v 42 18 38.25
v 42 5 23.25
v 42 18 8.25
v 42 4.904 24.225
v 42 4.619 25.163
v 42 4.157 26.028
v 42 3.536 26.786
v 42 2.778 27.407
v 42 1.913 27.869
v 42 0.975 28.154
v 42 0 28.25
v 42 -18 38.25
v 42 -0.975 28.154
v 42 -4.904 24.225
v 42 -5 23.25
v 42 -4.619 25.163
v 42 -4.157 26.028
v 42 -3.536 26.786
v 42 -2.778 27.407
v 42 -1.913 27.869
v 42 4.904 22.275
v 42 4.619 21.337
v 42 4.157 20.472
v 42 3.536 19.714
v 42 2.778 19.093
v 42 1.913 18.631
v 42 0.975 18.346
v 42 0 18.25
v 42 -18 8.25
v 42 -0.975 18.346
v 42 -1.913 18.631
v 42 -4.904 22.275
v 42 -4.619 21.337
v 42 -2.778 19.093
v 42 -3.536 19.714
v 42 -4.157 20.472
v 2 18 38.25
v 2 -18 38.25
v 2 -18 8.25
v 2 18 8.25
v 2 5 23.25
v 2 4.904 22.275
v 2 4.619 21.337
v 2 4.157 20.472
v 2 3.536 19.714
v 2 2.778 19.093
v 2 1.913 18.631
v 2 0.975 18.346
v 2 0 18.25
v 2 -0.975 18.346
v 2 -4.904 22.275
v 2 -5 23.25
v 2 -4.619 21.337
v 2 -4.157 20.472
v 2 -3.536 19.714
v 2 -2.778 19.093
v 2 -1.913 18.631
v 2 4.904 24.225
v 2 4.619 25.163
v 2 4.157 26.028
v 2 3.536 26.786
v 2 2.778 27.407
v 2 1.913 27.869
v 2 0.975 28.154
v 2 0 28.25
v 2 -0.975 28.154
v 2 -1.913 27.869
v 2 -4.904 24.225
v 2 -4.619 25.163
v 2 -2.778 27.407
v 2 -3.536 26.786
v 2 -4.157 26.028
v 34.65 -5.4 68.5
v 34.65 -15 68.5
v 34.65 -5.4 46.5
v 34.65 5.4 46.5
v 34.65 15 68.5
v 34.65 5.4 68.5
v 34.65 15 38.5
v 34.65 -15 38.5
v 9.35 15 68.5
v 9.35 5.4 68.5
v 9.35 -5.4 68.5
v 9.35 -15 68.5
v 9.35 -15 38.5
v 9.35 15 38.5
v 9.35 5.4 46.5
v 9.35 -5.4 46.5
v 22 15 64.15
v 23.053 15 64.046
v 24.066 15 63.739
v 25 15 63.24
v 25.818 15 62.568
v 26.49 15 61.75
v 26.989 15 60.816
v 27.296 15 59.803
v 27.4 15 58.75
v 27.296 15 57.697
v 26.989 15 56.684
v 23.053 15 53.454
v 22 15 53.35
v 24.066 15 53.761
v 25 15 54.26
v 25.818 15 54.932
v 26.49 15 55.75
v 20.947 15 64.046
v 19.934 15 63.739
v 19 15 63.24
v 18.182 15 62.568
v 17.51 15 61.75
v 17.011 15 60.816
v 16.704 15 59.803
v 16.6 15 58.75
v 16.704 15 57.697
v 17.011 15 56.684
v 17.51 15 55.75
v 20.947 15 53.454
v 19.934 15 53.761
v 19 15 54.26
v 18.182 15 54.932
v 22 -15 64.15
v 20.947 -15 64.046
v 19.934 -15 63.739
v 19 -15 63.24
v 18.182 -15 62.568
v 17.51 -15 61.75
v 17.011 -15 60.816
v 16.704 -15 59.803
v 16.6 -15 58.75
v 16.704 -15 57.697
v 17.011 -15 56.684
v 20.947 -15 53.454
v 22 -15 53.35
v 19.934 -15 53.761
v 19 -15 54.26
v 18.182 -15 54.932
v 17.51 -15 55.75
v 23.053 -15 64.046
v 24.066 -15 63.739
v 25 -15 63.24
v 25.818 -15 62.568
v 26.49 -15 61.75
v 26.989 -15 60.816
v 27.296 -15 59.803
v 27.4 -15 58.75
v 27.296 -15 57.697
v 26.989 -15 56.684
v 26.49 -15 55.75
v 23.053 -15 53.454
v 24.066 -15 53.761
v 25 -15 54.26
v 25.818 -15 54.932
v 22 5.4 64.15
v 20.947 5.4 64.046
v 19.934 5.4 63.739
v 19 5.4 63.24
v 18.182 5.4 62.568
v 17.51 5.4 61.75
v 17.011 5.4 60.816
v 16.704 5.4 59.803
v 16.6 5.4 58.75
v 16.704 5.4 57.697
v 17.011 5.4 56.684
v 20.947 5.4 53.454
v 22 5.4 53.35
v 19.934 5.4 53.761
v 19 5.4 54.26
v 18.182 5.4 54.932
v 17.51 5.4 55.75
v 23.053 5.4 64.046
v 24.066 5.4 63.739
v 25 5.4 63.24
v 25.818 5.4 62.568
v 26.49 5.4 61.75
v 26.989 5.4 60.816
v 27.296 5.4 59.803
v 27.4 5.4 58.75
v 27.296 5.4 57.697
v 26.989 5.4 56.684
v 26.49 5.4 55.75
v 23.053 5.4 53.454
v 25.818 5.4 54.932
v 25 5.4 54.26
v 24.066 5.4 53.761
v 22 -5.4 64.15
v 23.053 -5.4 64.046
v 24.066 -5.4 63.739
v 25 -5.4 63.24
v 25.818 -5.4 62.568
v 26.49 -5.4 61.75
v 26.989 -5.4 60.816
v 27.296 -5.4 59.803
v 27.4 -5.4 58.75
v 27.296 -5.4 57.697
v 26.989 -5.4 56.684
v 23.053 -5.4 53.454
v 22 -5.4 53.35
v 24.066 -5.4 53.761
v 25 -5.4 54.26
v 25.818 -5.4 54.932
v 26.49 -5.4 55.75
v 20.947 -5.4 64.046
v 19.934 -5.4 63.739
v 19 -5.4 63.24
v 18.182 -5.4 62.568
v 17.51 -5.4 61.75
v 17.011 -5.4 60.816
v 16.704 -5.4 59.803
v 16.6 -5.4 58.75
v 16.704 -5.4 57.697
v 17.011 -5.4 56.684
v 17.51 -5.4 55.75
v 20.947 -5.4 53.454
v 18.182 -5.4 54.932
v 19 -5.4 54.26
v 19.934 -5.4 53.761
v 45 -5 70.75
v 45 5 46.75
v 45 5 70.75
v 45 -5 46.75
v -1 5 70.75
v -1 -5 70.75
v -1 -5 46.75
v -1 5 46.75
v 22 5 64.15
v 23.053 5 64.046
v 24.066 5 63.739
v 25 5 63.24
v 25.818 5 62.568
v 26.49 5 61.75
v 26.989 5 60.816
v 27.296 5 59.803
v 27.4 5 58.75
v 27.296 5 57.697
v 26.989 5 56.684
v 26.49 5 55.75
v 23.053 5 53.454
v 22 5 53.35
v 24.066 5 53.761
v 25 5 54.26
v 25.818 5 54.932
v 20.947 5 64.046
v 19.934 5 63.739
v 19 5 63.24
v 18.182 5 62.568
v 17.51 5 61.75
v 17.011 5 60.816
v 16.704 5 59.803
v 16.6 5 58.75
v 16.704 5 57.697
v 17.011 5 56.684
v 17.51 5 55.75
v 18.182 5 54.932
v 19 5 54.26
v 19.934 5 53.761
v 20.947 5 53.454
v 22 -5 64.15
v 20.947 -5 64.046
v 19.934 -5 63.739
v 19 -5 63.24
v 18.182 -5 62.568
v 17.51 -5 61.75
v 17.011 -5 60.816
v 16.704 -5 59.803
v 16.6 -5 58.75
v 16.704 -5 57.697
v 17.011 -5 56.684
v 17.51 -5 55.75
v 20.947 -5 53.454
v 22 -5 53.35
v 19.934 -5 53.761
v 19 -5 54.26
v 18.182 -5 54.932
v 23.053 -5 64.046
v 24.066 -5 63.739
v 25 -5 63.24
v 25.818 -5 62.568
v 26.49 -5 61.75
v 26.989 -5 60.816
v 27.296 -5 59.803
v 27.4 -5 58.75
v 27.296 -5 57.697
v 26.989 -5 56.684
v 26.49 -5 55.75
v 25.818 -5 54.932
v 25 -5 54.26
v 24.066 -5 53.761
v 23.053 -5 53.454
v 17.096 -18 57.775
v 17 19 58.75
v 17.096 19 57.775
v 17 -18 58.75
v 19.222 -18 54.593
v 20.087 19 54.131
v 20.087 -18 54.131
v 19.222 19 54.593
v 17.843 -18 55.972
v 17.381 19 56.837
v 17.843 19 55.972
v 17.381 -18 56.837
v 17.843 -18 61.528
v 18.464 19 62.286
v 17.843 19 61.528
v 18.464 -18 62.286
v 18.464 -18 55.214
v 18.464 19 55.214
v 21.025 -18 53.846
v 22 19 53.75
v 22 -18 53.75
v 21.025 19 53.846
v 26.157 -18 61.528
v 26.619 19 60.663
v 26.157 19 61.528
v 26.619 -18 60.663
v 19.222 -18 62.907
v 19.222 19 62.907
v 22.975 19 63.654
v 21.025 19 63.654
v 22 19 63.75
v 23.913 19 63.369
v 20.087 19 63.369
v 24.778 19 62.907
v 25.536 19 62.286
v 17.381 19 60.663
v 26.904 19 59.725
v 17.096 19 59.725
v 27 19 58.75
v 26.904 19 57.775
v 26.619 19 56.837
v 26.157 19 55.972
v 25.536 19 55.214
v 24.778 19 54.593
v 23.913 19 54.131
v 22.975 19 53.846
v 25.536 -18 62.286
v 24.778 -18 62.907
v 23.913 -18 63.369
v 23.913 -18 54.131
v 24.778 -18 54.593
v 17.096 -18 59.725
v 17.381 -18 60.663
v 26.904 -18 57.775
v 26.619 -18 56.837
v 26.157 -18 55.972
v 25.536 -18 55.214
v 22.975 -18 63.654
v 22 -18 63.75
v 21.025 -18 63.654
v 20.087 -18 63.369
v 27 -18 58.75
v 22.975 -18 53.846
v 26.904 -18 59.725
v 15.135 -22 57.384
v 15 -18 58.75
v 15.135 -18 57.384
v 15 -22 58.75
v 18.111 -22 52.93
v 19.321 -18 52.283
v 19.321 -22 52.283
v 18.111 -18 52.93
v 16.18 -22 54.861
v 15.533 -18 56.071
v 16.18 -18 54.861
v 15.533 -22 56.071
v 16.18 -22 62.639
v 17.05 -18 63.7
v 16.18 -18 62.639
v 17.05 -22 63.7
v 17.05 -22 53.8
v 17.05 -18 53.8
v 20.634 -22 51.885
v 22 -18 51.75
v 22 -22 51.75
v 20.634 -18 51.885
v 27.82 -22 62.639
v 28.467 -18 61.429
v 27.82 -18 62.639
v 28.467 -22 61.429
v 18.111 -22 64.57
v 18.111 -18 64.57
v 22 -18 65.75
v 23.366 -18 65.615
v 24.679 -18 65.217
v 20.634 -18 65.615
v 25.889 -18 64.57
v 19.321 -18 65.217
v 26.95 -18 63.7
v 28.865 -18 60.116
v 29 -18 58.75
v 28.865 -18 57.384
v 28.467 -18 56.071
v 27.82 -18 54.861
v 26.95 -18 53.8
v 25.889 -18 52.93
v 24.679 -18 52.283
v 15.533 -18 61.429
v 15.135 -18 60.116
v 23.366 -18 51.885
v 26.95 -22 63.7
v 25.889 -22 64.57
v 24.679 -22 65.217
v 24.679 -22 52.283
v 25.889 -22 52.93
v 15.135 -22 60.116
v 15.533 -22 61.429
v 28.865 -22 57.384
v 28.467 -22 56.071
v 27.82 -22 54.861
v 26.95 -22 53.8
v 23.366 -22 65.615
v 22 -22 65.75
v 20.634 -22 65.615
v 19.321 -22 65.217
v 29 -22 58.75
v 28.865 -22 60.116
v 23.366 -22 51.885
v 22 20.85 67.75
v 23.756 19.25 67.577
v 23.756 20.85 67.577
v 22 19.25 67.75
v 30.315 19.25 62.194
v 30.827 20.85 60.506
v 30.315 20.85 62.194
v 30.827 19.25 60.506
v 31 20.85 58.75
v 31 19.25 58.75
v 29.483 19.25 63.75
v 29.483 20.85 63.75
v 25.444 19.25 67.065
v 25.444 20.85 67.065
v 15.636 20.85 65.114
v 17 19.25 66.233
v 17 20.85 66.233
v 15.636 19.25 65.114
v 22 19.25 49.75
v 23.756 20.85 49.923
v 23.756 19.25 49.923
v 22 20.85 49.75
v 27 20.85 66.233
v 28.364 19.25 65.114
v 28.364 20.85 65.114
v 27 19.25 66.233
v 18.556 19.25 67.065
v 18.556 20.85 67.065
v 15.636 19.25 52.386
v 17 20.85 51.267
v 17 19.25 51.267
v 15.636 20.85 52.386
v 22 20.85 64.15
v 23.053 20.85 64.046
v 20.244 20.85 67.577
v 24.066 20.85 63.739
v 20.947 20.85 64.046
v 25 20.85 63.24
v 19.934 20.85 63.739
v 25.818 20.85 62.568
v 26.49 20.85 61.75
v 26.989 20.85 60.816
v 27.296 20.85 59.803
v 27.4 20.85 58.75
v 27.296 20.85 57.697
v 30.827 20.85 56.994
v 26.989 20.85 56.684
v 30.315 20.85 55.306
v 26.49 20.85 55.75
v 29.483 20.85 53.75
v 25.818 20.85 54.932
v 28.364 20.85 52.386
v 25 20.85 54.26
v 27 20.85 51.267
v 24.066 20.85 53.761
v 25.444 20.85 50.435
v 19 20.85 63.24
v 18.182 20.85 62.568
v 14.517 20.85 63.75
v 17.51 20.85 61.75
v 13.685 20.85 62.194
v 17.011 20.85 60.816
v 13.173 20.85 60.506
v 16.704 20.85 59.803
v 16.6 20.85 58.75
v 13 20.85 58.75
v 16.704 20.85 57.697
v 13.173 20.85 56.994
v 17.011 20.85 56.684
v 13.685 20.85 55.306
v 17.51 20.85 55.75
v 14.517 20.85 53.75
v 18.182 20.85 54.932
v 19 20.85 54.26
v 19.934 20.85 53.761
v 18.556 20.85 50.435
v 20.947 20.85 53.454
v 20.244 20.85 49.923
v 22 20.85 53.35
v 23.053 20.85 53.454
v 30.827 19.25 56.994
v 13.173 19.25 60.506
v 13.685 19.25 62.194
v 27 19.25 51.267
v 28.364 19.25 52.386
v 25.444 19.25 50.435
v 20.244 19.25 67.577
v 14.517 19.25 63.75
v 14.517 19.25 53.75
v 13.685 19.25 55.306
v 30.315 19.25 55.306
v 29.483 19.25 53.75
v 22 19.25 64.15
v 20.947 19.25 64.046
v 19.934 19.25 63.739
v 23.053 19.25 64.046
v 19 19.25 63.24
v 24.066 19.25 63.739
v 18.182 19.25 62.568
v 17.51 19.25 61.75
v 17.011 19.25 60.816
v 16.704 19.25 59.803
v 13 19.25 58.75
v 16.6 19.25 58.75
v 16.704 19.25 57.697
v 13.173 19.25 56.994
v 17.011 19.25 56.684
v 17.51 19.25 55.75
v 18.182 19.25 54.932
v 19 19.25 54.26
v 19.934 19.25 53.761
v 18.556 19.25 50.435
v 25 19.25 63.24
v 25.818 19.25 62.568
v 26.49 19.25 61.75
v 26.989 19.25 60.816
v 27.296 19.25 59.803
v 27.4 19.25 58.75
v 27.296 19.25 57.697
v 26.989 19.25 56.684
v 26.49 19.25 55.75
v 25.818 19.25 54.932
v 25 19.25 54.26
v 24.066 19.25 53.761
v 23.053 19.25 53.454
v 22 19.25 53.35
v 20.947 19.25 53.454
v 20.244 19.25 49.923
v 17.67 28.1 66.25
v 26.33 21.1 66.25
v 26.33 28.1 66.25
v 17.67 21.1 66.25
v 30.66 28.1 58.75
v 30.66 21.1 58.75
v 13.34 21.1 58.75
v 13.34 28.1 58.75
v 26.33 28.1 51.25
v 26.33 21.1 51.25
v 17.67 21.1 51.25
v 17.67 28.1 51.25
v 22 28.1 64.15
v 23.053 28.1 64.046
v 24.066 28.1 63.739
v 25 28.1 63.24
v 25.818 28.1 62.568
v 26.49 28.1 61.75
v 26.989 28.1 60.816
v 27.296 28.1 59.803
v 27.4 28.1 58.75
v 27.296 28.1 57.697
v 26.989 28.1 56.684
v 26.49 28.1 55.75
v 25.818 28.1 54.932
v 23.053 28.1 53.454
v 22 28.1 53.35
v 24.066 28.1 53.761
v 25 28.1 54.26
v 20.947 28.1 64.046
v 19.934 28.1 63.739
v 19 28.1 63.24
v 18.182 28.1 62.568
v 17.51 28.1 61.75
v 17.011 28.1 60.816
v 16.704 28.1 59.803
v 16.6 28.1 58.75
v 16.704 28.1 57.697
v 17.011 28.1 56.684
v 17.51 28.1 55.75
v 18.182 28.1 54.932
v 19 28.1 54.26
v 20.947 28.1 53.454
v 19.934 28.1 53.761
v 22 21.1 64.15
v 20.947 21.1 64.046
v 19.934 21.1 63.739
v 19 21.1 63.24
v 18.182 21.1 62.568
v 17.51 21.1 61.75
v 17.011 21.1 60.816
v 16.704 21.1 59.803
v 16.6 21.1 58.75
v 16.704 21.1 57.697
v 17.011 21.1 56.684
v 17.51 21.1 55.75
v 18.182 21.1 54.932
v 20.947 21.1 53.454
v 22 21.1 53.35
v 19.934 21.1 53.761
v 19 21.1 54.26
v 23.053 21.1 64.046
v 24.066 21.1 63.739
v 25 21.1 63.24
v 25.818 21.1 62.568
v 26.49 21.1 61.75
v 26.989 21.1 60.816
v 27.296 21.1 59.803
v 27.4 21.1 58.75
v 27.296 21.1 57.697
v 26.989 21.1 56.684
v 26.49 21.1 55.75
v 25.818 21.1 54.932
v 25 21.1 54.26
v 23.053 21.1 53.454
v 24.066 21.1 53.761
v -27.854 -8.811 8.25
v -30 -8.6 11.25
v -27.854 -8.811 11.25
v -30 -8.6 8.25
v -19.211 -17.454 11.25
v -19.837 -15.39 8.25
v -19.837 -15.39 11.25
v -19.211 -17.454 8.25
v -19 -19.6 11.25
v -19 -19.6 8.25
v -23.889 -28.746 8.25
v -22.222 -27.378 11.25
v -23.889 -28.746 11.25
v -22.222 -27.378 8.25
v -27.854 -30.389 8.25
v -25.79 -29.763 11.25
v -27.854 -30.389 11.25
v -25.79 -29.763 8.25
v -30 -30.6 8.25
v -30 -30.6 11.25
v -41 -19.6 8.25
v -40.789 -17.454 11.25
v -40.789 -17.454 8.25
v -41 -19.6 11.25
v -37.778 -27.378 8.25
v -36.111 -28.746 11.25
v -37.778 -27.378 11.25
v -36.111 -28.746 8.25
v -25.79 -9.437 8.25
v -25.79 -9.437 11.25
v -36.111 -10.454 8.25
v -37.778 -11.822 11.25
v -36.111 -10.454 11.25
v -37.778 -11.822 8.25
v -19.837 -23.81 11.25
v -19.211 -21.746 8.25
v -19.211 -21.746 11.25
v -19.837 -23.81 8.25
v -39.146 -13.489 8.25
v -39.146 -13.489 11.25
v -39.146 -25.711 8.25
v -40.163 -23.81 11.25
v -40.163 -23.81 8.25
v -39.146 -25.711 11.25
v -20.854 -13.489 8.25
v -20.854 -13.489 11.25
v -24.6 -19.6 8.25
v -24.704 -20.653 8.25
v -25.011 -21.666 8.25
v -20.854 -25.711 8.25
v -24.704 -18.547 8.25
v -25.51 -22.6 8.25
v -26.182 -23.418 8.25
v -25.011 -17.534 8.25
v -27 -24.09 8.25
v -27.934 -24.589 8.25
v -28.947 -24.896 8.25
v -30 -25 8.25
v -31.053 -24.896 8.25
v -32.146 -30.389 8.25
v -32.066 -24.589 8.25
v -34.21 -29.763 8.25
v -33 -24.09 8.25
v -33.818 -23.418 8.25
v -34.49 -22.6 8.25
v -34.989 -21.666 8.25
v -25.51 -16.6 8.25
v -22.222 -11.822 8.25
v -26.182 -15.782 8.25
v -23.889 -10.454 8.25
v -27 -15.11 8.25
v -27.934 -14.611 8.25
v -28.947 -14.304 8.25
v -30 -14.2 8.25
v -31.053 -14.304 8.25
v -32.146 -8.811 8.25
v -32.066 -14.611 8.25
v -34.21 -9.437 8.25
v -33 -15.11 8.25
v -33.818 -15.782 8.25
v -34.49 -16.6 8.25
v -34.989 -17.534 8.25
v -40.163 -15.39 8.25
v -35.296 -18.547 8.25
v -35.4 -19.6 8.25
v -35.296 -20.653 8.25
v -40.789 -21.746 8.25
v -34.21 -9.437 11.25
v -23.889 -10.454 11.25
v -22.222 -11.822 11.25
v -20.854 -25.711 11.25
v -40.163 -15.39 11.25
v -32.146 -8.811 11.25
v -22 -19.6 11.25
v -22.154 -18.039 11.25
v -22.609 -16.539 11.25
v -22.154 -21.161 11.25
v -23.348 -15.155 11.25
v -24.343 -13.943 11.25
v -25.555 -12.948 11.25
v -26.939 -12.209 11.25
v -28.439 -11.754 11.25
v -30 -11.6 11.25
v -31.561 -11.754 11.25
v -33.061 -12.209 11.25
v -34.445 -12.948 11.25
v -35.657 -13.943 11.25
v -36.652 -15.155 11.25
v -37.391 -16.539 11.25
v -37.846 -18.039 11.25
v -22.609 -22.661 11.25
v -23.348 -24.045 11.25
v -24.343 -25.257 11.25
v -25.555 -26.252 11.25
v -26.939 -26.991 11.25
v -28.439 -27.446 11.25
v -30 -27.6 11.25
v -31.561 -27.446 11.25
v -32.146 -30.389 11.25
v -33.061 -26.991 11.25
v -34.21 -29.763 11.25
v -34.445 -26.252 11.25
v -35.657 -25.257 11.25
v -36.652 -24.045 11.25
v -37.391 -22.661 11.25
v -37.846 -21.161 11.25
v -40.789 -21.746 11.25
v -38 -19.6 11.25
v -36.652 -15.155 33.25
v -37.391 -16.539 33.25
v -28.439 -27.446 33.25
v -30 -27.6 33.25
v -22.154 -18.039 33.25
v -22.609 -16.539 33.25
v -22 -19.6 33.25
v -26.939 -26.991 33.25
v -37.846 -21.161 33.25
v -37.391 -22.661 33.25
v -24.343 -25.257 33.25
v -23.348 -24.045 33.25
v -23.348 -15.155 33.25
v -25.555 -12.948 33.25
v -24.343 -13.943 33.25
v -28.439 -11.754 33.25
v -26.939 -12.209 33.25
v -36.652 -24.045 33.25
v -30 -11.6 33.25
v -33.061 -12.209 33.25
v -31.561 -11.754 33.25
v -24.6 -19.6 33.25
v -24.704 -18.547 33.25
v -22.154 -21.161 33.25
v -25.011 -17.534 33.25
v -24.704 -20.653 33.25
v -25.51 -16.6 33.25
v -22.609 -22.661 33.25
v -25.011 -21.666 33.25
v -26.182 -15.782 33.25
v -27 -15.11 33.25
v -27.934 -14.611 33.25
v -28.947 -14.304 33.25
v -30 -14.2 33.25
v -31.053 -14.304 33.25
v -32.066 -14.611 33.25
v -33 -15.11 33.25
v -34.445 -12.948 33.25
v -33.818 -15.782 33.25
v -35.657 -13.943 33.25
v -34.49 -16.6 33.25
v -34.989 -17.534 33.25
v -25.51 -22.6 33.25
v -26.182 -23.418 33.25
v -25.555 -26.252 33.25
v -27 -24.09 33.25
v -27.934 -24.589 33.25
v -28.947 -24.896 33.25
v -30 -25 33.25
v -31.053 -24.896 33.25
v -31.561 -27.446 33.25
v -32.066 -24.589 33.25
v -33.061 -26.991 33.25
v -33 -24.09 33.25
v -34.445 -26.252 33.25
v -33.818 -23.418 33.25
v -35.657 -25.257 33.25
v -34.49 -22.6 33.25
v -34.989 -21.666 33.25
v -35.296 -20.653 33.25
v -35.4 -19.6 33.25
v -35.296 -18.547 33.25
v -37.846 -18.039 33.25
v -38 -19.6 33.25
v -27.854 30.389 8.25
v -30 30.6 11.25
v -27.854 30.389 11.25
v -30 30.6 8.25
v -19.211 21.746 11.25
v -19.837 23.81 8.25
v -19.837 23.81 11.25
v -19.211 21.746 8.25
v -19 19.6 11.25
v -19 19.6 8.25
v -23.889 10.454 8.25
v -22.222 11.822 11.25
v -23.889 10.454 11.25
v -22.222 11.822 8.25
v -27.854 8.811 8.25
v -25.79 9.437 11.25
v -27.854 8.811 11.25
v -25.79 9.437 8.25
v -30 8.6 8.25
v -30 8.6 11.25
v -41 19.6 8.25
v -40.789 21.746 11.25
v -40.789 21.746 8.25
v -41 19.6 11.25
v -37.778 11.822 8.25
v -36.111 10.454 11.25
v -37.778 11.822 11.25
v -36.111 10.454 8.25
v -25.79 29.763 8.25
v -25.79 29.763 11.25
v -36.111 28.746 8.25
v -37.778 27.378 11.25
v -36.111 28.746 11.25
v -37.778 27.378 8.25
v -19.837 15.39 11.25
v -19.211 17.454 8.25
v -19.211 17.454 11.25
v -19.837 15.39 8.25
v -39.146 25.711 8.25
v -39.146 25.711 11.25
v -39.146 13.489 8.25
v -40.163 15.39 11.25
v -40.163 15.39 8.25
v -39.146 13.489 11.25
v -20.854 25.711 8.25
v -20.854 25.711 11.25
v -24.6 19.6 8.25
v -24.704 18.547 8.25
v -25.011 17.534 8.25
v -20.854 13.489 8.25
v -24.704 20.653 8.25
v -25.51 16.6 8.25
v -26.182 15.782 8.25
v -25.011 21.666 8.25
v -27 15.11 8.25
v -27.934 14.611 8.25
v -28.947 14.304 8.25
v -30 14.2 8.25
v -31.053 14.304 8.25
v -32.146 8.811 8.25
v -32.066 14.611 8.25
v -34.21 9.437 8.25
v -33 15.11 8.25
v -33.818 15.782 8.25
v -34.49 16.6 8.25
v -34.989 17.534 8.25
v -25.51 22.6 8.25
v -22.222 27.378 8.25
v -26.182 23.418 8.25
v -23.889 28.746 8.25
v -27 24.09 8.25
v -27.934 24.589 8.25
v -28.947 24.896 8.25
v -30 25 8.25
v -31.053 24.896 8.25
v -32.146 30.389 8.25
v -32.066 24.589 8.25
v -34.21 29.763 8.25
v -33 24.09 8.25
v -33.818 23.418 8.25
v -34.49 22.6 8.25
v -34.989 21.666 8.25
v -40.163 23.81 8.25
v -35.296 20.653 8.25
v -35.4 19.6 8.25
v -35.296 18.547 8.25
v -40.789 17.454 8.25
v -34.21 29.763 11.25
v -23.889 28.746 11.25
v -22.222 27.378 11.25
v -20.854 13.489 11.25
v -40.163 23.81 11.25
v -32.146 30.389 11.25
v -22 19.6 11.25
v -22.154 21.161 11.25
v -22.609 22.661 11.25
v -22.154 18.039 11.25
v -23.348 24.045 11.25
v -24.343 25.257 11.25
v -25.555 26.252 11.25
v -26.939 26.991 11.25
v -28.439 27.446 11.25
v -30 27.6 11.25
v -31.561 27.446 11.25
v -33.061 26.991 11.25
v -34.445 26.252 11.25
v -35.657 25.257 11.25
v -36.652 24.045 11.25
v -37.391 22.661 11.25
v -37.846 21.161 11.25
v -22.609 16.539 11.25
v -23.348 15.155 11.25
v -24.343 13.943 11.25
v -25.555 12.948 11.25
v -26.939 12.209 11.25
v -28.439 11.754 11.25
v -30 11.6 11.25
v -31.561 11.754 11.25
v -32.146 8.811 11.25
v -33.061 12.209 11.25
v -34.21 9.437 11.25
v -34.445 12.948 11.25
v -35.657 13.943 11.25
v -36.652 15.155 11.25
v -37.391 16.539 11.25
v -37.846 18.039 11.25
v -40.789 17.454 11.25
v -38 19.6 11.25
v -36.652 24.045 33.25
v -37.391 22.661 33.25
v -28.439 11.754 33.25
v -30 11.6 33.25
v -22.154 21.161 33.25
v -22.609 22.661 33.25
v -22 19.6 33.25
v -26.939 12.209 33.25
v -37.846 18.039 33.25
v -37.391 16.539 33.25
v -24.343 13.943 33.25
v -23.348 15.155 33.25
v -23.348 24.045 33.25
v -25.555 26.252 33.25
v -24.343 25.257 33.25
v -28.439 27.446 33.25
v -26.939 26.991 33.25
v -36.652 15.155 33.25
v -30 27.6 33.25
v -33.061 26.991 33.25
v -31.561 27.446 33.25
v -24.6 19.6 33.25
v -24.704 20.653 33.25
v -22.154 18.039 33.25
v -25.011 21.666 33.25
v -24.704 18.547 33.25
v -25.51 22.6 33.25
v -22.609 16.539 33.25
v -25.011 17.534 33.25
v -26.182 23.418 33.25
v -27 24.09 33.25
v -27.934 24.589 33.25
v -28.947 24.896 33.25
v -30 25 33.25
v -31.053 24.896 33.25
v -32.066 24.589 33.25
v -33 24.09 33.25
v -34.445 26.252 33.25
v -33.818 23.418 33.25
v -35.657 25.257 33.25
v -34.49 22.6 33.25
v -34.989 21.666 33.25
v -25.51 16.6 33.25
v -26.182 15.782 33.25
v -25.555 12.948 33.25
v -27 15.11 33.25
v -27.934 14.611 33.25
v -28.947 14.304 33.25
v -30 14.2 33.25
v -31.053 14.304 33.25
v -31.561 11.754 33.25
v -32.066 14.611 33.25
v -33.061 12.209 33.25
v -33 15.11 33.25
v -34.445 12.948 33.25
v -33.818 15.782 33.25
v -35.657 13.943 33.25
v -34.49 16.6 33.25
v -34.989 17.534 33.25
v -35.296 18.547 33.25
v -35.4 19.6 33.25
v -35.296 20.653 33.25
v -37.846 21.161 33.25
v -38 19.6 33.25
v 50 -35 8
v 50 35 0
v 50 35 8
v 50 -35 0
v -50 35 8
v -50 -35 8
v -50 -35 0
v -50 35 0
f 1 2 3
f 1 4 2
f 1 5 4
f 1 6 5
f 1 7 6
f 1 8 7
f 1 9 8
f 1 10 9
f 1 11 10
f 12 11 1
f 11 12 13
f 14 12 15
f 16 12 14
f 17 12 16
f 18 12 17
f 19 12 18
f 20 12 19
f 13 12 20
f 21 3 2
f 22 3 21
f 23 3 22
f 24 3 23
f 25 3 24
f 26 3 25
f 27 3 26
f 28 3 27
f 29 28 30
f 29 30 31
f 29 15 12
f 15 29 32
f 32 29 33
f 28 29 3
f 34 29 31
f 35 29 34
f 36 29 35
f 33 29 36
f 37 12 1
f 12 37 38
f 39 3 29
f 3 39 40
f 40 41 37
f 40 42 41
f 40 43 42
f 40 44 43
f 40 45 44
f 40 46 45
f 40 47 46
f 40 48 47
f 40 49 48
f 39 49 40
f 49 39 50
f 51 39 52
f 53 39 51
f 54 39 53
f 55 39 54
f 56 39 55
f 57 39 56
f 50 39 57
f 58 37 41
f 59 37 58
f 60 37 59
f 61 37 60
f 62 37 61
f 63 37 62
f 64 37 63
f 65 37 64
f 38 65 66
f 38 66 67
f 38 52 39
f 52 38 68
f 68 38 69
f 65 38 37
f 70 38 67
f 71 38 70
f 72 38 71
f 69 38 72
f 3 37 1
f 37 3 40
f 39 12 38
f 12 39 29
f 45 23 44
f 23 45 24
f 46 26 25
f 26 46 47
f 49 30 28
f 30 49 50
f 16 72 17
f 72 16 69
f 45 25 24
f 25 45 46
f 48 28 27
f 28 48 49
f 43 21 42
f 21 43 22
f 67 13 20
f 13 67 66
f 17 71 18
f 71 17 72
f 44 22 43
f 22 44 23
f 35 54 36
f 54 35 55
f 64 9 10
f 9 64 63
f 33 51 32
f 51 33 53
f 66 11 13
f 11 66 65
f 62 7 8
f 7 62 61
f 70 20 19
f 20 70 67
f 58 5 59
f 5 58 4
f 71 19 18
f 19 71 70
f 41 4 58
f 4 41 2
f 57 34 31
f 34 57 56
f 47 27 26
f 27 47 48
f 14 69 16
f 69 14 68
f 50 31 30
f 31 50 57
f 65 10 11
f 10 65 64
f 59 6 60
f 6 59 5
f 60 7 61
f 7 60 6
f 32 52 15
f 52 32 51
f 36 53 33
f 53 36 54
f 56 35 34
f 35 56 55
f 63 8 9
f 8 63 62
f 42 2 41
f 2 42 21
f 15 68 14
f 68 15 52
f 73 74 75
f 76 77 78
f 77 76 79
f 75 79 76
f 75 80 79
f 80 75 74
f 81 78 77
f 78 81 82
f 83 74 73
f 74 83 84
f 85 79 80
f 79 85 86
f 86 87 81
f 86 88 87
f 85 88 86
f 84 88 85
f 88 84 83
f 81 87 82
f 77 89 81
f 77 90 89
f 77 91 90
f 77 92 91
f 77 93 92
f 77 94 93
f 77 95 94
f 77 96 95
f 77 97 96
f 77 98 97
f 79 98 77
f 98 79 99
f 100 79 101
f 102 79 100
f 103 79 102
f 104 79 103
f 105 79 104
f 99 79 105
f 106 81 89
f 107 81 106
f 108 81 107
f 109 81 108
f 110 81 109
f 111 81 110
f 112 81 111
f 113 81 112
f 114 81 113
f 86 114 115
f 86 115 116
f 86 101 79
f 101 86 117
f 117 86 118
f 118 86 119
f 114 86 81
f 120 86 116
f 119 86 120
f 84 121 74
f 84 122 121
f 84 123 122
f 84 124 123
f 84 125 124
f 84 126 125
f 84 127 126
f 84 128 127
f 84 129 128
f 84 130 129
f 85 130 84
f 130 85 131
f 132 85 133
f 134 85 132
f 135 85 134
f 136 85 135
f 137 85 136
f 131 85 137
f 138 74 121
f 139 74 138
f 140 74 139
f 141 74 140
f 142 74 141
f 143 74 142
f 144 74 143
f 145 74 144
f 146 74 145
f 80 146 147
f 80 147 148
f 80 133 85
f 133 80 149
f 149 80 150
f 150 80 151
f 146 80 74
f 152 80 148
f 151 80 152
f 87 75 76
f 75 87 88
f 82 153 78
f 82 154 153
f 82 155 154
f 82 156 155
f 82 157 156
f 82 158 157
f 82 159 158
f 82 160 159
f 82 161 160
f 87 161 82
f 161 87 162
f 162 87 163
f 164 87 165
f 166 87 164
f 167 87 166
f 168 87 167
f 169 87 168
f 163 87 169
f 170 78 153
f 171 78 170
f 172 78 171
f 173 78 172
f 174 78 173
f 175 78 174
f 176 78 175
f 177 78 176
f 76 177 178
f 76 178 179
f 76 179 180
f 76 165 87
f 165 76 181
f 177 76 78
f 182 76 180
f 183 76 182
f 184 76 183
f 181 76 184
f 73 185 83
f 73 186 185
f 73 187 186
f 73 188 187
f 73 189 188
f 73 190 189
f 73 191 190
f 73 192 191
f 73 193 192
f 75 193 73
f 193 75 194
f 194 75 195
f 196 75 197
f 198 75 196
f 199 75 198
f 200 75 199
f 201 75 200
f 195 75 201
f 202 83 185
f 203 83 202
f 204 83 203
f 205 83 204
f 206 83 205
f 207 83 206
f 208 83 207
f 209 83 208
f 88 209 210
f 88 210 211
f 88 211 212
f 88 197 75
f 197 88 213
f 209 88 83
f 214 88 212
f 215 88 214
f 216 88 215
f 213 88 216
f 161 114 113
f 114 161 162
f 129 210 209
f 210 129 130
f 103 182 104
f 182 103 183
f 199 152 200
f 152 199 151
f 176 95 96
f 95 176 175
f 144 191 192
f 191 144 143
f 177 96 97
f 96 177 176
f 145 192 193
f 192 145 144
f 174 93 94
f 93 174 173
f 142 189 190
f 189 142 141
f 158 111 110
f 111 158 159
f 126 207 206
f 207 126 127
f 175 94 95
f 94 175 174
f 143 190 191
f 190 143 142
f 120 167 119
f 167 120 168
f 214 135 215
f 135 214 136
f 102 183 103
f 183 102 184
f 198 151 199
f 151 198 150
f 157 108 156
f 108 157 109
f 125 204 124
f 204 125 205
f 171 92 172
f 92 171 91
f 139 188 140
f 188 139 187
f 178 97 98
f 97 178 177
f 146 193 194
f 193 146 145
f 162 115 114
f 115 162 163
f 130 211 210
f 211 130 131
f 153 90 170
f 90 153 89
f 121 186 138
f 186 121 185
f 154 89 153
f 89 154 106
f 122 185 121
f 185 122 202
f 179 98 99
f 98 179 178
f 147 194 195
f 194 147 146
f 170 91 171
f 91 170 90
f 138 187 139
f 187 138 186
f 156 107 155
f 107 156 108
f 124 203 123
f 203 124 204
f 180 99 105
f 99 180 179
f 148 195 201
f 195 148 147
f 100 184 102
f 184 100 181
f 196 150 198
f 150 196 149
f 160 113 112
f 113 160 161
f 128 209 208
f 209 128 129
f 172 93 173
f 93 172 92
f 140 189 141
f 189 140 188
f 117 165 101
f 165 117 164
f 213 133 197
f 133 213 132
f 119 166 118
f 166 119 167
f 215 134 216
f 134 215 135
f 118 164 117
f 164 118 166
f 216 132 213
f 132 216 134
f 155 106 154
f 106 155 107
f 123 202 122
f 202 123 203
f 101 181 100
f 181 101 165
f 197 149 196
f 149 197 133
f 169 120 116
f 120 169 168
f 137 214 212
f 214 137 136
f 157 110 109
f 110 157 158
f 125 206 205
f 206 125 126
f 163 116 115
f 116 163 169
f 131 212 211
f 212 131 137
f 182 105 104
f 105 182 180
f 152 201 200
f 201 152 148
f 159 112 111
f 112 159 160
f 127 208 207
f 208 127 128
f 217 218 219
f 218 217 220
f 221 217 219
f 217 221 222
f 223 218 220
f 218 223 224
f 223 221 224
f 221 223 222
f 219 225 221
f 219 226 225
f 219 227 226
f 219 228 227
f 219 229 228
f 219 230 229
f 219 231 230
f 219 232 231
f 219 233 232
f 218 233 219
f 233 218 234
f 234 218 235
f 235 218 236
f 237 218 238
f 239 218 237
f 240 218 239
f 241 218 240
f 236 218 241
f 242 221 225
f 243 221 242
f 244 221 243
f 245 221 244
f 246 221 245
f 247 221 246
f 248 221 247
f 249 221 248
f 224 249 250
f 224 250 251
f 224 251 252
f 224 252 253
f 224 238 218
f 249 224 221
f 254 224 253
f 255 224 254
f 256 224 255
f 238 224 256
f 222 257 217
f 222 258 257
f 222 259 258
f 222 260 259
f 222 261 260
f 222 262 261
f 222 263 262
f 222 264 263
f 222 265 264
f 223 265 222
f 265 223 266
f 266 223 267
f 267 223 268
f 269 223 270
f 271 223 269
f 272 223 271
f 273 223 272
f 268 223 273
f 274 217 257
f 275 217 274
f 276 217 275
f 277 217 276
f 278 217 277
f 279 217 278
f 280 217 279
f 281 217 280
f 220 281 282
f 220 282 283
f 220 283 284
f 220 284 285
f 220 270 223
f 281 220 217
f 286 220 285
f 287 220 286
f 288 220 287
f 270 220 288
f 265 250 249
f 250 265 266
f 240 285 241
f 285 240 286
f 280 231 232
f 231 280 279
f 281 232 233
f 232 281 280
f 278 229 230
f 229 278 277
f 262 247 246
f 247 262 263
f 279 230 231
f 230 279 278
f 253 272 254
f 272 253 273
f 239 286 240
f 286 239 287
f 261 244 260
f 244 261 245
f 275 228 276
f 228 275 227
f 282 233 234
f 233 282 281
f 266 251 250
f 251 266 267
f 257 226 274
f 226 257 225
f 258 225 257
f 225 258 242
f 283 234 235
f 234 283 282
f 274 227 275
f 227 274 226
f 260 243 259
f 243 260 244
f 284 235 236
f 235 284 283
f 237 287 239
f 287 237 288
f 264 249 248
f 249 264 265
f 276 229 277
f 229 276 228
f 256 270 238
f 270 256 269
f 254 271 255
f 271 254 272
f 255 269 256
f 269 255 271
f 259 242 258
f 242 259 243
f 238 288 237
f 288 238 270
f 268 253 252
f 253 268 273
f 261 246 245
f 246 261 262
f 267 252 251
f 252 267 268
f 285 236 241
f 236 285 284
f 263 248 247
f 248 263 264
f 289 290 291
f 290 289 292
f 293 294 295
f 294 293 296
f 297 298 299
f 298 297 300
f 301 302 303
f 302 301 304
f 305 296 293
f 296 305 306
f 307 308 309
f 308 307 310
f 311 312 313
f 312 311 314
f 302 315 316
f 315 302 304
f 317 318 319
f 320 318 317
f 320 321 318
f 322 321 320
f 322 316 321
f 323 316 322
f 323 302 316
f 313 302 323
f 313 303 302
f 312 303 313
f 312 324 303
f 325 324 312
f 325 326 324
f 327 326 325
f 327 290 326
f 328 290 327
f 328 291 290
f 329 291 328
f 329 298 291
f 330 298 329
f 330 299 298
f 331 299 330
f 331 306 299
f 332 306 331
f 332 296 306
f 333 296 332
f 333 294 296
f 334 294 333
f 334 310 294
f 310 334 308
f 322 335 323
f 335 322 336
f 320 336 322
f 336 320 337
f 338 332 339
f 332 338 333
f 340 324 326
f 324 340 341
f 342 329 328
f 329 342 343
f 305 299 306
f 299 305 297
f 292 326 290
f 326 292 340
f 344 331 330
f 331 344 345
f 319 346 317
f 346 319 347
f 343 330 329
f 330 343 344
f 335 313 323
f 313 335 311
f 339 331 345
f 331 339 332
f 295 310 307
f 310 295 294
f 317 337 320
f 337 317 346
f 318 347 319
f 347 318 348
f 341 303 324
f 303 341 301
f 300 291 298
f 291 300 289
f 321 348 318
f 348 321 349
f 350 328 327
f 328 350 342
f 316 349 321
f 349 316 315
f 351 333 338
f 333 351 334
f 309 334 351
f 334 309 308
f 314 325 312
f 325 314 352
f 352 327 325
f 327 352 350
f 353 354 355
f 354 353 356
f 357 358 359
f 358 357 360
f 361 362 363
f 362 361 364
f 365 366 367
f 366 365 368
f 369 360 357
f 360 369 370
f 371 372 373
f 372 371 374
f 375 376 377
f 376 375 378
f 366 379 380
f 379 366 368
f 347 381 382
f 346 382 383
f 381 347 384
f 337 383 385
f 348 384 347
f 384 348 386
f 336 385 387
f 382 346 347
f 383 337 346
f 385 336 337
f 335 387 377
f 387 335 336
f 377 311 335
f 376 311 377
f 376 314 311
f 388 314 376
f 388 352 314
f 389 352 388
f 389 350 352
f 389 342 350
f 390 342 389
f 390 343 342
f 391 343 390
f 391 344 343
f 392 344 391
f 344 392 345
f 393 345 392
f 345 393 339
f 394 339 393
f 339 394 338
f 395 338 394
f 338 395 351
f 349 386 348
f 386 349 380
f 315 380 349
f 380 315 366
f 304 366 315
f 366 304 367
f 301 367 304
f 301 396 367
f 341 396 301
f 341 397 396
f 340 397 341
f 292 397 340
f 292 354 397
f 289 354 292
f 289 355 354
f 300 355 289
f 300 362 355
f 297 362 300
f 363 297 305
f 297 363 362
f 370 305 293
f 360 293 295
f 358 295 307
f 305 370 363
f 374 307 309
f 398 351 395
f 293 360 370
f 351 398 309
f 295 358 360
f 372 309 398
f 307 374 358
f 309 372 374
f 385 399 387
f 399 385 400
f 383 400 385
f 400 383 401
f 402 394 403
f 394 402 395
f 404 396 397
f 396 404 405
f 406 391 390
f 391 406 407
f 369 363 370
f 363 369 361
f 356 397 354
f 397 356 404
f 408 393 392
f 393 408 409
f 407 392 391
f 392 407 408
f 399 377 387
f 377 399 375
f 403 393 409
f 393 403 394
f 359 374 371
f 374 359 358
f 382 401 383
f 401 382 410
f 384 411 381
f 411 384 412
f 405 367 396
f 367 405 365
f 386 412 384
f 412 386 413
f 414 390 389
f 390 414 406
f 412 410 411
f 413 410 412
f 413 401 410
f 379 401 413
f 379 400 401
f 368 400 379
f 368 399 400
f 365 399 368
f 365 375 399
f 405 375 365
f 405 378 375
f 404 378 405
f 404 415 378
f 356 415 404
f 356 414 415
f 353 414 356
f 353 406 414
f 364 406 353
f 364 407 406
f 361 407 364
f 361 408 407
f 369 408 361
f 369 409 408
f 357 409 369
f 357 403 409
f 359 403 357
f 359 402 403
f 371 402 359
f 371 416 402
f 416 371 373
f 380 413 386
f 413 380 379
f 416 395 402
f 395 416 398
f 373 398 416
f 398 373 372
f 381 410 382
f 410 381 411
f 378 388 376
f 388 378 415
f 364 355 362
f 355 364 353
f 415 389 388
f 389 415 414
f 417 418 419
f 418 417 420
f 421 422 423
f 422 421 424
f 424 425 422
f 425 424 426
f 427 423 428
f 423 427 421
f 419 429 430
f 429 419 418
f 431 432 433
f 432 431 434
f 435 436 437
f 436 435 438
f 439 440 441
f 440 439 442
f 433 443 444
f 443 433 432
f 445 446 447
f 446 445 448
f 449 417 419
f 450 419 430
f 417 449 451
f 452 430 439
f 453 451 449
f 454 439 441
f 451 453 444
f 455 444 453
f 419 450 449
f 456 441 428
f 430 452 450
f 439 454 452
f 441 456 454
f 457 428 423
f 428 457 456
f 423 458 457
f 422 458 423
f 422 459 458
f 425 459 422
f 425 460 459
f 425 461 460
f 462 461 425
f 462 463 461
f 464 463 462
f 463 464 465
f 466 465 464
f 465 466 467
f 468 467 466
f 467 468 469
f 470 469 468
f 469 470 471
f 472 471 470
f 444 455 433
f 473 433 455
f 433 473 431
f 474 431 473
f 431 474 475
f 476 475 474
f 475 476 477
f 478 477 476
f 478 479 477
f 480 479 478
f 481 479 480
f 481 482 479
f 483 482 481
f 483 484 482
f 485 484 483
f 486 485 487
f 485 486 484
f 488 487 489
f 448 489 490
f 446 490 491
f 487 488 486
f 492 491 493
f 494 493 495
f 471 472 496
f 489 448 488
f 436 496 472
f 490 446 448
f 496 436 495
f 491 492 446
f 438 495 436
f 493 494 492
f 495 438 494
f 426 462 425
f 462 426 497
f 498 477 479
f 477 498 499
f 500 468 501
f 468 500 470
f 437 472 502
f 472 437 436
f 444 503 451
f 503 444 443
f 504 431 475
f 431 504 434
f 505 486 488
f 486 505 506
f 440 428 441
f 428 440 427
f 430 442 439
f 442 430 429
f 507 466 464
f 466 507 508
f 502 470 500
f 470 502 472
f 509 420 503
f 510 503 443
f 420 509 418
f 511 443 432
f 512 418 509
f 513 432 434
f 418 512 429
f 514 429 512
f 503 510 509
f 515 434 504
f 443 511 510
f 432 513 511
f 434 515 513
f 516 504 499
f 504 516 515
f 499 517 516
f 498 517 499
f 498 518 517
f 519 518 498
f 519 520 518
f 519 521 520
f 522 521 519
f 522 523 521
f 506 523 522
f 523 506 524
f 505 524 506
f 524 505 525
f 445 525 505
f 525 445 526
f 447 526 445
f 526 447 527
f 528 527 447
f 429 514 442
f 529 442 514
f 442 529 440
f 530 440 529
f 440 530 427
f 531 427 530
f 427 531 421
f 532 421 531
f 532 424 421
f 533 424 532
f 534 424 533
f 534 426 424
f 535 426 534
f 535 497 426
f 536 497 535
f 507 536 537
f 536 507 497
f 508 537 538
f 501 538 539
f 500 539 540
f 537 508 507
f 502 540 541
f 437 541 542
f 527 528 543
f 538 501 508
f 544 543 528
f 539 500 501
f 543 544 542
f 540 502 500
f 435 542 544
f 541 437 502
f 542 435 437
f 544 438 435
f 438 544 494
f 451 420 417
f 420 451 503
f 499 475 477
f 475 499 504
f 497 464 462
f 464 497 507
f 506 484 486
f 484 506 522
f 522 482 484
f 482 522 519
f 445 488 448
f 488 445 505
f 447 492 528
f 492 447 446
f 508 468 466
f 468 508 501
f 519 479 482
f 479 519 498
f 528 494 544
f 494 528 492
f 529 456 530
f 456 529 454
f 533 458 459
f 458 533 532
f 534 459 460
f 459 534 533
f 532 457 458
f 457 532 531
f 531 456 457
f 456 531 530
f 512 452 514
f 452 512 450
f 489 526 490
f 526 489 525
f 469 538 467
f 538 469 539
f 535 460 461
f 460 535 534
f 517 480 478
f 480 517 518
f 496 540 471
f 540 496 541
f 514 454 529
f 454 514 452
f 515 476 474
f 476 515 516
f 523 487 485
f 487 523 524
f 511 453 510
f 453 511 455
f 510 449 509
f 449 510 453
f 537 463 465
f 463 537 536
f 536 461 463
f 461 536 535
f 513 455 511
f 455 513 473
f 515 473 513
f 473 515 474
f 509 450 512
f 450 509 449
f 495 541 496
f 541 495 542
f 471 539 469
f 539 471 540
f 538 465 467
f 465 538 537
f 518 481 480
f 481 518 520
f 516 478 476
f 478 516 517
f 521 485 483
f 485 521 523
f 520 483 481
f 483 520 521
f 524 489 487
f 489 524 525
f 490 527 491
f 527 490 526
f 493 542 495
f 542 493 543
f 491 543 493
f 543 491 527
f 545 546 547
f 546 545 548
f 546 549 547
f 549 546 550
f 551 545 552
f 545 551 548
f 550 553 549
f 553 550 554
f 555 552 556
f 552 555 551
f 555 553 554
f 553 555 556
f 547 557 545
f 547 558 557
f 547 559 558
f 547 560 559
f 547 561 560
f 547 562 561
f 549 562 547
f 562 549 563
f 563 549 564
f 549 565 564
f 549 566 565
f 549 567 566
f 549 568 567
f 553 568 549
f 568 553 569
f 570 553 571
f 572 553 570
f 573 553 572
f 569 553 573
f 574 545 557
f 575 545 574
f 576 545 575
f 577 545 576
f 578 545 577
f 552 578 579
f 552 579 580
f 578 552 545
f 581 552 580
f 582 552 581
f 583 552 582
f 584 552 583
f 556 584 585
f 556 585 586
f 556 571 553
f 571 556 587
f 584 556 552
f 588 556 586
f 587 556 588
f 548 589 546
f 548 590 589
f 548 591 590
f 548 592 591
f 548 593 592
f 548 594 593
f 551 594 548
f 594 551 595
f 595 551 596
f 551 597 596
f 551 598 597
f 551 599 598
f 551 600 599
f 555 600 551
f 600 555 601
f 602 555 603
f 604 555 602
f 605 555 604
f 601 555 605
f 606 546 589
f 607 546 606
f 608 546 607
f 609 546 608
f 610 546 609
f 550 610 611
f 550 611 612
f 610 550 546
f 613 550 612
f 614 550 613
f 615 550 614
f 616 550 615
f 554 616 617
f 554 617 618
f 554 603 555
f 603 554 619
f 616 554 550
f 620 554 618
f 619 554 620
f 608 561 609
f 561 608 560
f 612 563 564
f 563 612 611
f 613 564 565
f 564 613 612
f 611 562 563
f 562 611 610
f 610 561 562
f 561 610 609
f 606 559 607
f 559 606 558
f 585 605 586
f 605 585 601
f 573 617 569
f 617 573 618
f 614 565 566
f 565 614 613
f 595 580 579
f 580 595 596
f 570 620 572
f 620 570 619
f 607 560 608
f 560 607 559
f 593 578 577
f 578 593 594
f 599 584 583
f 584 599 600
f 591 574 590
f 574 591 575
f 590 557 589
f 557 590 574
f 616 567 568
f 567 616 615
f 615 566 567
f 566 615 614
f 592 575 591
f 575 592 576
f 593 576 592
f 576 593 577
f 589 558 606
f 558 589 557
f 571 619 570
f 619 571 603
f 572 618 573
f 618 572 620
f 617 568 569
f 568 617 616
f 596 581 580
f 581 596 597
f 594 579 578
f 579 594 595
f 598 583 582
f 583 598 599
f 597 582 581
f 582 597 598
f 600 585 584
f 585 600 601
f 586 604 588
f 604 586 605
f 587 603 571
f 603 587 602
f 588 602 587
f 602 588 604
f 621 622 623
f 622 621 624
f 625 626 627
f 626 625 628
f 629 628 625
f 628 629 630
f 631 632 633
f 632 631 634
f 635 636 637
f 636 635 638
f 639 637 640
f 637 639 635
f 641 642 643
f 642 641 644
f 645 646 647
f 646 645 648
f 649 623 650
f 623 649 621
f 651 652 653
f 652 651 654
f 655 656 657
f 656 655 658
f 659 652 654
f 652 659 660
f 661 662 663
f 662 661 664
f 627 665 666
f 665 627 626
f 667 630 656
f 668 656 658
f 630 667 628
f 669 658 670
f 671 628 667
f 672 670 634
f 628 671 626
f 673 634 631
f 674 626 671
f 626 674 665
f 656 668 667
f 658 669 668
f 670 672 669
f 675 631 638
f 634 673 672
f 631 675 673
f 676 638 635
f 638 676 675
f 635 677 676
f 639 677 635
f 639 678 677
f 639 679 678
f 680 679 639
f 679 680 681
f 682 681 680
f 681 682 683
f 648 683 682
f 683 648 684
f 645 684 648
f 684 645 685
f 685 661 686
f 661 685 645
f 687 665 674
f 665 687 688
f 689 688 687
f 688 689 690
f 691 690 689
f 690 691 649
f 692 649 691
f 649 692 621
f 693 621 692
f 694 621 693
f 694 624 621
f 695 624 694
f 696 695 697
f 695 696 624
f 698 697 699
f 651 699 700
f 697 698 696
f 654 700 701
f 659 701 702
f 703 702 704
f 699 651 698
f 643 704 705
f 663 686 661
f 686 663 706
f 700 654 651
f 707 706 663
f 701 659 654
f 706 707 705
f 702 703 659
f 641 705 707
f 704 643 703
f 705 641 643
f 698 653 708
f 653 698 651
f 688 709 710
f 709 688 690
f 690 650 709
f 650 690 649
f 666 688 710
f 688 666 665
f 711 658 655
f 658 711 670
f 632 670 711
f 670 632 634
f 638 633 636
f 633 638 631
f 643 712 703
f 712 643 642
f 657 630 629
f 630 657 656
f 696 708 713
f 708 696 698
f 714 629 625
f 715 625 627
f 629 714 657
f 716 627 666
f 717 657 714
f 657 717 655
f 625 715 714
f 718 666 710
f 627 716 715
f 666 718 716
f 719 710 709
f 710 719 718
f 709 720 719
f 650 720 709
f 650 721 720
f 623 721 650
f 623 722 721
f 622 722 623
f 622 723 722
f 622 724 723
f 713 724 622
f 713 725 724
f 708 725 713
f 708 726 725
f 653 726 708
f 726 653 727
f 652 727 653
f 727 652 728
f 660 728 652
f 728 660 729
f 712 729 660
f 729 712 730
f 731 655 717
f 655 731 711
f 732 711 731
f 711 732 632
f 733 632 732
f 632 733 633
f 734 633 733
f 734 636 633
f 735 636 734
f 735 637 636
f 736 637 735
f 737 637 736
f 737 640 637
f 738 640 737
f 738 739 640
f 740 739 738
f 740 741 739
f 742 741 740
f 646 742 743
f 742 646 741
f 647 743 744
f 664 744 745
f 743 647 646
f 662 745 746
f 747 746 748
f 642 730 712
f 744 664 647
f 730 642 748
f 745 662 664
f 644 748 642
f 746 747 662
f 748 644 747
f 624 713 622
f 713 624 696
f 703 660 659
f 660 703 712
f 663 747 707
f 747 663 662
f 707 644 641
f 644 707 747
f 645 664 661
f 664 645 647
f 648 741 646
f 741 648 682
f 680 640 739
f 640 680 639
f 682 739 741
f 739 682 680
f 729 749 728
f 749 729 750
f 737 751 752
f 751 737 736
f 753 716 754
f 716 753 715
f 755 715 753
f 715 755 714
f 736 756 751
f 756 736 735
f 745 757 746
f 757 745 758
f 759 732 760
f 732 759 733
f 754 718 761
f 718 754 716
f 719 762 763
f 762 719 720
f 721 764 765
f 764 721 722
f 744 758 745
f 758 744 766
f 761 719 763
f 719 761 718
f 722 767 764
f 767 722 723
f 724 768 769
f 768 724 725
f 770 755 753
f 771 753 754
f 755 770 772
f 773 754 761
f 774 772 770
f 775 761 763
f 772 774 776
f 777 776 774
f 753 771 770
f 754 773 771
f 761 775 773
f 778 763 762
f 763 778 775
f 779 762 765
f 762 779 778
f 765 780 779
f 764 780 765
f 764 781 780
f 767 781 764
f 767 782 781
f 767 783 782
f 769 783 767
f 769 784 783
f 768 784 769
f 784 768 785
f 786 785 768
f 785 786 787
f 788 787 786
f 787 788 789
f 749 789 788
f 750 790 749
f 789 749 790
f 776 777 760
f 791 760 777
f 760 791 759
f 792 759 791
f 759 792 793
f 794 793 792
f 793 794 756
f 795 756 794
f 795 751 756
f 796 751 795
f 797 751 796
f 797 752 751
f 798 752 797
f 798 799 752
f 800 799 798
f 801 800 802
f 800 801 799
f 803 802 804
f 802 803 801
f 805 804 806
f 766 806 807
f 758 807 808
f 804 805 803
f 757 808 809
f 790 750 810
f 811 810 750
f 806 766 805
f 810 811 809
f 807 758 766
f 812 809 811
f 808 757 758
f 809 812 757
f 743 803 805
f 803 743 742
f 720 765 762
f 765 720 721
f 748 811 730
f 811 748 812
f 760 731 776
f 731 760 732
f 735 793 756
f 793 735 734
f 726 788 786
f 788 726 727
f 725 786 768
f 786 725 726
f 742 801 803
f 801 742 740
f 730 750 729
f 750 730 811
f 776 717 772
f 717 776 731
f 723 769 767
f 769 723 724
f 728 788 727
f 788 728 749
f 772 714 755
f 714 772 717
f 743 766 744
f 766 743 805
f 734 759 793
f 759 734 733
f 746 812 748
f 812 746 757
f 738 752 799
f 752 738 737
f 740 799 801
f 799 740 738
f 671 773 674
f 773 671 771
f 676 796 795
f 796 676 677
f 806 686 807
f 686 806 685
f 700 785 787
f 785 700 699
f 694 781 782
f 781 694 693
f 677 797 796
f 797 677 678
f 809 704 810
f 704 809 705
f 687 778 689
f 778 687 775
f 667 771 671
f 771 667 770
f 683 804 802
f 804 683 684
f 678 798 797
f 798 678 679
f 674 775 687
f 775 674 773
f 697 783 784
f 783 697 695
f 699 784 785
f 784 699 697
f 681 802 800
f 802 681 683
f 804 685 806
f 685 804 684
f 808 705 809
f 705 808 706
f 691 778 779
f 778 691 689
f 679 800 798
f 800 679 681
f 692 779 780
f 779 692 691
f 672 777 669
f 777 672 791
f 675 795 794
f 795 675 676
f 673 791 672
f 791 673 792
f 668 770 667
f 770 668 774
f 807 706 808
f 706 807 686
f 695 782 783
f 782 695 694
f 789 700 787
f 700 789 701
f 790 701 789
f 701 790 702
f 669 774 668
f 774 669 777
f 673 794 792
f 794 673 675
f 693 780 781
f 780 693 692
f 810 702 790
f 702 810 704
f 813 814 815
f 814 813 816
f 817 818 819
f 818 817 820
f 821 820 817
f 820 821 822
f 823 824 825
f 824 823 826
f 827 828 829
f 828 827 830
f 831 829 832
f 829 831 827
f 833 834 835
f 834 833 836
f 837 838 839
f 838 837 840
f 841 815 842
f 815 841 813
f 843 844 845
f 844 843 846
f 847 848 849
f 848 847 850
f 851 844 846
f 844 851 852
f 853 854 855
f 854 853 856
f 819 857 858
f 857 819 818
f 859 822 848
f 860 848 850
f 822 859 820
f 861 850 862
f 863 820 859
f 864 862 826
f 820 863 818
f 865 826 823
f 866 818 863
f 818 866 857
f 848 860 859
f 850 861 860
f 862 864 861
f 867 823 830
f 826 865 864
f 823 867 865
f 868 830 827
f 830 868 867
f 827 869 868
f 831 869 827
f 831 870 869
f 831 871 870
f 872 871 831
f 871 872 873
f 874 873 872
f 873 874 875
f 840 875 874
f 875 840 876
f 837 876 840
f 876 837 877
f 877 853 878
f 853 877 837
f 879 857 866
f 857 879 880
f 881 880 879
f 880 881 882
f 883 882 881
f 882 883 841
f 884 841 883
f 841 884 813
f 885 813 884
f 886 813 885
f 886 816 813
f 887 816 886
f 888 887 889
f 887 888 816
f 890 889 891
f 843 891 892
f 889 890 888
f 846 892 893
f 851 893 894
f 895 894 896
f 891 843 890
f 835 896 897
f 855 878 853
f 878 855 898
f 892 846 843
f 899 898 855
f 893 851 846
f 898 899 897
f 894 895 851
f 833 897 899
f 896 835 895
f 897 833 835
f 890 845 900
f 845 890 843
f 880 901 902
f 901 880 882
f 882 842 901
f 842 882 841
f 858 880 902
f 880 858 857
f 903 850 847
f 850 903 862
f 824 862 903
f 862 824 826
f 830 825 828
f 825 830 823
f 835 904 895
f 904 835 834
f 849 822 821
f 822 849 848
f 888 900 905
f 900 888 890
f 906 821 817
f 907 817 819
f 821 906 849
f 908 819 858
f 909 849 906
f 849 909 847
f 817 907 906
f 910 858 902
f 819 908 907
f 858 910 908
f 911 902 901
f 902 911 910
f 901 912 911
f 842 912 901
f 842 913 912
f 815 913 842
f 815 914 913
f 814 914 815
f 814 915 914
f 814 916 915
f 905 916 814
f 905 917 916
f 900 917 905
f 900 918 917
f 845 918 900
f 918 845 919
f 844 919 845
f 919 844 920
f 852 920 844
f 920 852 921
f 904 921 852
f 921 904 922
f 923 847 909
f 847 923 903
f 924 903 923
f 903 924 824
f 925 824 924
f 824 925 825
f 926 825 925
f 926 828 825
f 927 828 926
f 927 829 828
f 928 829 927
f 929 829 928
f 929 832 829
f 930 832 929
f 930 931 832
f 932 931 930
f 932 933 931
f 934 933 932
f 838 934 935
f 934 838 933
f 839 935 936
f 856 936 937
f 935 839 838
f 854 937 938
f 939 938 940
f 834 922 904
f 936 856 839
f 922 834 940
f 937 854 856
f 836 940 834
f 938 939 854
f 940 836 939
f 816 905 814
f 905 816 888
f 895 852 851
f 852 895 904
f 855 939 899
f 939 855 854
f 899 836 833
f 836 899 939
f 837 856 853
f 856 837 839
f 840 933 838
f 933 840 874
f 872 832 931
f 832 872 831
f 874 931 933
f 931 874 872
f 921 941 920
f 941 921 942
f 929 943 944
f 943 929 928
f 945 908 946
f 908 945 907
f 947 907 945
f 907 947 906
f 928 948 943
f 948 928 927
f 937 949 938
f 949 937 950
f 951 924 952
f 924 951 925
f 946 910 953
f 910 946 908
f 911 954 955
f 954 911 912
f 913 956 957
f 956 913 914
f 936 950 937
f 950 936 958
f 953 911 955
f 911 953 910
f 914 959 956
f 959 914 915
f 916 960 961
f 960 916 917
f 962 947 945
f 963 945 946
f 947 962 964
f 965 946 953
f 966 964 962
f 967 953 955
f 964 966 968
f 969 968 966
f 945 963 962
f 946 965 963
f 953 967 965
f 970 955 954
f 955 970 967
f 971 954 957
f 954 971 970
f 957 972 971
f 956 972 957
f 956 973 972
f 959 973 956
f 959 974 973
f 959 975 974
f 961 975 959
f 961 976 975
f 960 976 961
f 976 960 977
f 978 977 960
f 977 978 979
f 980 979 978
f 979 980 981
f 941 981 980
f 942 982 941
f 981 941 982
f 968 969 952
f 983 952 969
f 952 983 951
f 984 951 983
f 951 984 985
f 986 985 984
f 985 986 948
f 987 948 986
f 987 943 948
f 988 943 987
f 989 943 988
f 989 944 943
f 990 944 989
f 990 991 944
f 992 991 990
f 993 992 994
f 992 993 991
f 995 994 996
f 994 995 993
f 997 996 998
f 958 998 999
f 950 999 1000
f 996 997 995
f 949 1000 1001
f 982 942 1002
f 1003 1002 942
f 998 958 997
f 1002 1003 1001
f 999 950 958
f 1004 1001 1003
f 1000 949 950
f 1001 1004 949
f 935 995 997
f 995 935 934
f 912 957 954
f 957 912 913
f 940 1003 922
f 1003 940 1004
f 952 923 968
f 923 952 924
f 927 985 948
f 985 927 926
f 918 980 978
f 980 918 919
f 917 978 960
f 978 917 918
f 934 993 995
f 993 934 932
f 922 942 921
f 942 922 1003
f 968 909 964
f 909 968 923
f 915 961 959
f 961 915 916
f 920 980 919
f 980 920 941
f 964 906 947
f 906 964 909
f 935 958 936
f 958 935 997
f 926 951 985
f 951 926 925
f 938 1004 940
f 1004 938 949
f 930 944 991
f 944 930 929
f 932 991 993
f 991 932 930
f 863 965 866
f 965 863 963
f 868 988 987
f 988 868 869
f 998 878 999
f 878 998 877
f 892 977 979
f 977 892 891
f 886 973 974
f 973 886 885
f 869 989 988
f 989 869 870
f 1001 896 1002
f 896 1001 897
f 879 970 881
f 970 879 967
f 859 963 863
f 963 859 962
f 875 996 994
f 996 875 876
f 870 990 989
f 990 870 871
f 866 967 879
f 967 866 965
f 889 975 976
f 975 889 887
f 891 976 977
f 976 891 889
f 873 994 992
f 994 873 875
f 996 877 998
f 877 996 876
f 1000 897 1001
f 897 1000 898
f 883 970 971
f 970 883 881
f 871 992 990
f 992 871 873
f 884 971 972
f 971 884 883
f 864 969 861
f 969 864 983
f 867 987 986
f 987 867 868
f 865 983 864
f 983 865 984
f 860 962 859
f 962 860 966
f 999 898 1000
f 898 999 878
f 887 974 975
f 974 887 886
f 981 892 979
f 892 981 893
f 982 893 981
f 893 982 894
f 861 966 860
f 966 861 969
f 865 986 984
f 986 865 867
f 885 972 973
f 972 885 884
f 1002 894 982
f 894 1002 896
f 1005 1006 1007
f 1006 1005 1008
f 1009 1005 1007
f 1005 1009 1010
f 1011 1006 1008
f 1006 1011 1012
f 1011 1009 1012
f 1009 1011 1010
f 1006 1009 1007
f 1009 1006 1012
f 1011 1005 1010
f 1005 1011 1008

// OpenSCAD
$fn = 32;

// ------------------------------------------------------------------------
// Indexing jig: plate 100 x 70 mm, pin d10
// Every part is its own module, assembly() places every instance.
// ------------------------------------------------------------------------

// --- part 1 ---
module jig_plate() {
  difference() {
    translate([-50, -35, 0]) cube([100, 70, 8]);
  }
}

// --- part 2 ---
module locator_block() {
  difference() {
    translate([-20, -18, 0]) cube([40, 36, 30]);
    translate([0, 0, 15]) rotate([0, 90, 0]) cylinder(h = 42, d = 10, center = true);
  }
}

// --- part 3 ---
module index_fork() {
  difference() {
    translate([-12.65, -15, 0]) cube([25.3, 30, 30]);
    translate([-13.65, -5.4, 8]) cube([27.3, 10.8, 23]);
    translate([0, 0, 20.25]) rotate([90, 0, 0]) cylinder(h = 32, d = 10.8, center = true);
  }
}

// --- part 4 ---
module index_arm() {
  difference() {
    translate([-23, -5, 0]) cube([46, 10, 24]);
    translate([0, 0, 12]) rotate([90, 0, 0]) cylinder(h = 12, d = 10.8, center = true);
  }
}

// --- part 5 ---
module index_pin() {
  rotate([0, 90, 0]) cylinder(h = 38, d = 10, center = true);
  translate([-22, 0, 0]) rotate([0, 90, 0]) cylinder(h = 4, d = 14);
}

// --- part 6 ---
module pin_washer() {
  difference() {
      translate([0, 0, 0]) cylinder(h = 1.6, d = 18);
      translate([0, 0, -1]) cylinder(h = 3.6, d = 10.8);
    }
}

// --- part 7 ---
module lock_nut() {
  difference() {
    linear_extrude(height = 7) polygon(points = [[8.66, 0], [4.33, 7.5], [-4.33, 7.5], [-8.66, 0], [-4.33, -7.5], [4.33, -7.5]]);
    translate([0, 0, -1]) cylinder(h = 9, d = 10.8);
  }
}

// --- part 8 ---
module guide_bush_a() {
  difference() {
    union() {
      cylinder(h = 3, d = 22);
      translate([0, 0, 3]) cylinder(h = 22, d = 16);
    }
    translate([0, 0, -1]) cylinder(h = 27, d = 10.8);
  }
}

// --- part 9 ---
module guide_bush_b() {
  difference() {
    union() {
      cylinder(h = 3, d = 22);
      translate([0, 0, 3]) cylinder(h = 22, d = 16);
    }
    translate([0, 0, -1]) cylinder(h = 27, d = 10.8);
  }
}

// --- assembly ---
module assembly() {
  color([0.80, 0.24, 0.20]) translate([0, 0, 0]) rotate([0, 0, 0]) jig_plate();
  color([0.20, 0.45, 0.75]) translate([22, 0, 8.25]) rotate([0, 0, 0]) locator_block();
  color([0.25, 0.62, 0.32]) translate([22, 0, 38.5]) rotate([0, 0, 0]) index_fork();
  color([0.92, 0.70, 0.18]) translate([22, 0, 46.75]) rotate([0, 0, 0]) index_arm();
  color([0.58, 0.35, 0.70]) translate([22, 0, 58.75]) rotate([0, 0, 90]) index_pin();
  color([0.16, 0.66, 0.66]) translate([22, 20.85, 58.75]) rotate([90, 0, 0]) pin_washer();
  color([0.85, 0.48, 0.18]) translate([22, 28.1, 58.75]) rotate([90, 0, 0]) lock_nut();
  color([0.55, 0.60, 0.65]) translate([-30, -19.6, 8.25]) rotate([0, 0, 0]) guide_bush_a();
  color([0.75, 0.30, 0.55]) translate([-30, 19.6, 8.25]) rotate([0, 0, 0]) guide_bush_b();
}

assembly();
